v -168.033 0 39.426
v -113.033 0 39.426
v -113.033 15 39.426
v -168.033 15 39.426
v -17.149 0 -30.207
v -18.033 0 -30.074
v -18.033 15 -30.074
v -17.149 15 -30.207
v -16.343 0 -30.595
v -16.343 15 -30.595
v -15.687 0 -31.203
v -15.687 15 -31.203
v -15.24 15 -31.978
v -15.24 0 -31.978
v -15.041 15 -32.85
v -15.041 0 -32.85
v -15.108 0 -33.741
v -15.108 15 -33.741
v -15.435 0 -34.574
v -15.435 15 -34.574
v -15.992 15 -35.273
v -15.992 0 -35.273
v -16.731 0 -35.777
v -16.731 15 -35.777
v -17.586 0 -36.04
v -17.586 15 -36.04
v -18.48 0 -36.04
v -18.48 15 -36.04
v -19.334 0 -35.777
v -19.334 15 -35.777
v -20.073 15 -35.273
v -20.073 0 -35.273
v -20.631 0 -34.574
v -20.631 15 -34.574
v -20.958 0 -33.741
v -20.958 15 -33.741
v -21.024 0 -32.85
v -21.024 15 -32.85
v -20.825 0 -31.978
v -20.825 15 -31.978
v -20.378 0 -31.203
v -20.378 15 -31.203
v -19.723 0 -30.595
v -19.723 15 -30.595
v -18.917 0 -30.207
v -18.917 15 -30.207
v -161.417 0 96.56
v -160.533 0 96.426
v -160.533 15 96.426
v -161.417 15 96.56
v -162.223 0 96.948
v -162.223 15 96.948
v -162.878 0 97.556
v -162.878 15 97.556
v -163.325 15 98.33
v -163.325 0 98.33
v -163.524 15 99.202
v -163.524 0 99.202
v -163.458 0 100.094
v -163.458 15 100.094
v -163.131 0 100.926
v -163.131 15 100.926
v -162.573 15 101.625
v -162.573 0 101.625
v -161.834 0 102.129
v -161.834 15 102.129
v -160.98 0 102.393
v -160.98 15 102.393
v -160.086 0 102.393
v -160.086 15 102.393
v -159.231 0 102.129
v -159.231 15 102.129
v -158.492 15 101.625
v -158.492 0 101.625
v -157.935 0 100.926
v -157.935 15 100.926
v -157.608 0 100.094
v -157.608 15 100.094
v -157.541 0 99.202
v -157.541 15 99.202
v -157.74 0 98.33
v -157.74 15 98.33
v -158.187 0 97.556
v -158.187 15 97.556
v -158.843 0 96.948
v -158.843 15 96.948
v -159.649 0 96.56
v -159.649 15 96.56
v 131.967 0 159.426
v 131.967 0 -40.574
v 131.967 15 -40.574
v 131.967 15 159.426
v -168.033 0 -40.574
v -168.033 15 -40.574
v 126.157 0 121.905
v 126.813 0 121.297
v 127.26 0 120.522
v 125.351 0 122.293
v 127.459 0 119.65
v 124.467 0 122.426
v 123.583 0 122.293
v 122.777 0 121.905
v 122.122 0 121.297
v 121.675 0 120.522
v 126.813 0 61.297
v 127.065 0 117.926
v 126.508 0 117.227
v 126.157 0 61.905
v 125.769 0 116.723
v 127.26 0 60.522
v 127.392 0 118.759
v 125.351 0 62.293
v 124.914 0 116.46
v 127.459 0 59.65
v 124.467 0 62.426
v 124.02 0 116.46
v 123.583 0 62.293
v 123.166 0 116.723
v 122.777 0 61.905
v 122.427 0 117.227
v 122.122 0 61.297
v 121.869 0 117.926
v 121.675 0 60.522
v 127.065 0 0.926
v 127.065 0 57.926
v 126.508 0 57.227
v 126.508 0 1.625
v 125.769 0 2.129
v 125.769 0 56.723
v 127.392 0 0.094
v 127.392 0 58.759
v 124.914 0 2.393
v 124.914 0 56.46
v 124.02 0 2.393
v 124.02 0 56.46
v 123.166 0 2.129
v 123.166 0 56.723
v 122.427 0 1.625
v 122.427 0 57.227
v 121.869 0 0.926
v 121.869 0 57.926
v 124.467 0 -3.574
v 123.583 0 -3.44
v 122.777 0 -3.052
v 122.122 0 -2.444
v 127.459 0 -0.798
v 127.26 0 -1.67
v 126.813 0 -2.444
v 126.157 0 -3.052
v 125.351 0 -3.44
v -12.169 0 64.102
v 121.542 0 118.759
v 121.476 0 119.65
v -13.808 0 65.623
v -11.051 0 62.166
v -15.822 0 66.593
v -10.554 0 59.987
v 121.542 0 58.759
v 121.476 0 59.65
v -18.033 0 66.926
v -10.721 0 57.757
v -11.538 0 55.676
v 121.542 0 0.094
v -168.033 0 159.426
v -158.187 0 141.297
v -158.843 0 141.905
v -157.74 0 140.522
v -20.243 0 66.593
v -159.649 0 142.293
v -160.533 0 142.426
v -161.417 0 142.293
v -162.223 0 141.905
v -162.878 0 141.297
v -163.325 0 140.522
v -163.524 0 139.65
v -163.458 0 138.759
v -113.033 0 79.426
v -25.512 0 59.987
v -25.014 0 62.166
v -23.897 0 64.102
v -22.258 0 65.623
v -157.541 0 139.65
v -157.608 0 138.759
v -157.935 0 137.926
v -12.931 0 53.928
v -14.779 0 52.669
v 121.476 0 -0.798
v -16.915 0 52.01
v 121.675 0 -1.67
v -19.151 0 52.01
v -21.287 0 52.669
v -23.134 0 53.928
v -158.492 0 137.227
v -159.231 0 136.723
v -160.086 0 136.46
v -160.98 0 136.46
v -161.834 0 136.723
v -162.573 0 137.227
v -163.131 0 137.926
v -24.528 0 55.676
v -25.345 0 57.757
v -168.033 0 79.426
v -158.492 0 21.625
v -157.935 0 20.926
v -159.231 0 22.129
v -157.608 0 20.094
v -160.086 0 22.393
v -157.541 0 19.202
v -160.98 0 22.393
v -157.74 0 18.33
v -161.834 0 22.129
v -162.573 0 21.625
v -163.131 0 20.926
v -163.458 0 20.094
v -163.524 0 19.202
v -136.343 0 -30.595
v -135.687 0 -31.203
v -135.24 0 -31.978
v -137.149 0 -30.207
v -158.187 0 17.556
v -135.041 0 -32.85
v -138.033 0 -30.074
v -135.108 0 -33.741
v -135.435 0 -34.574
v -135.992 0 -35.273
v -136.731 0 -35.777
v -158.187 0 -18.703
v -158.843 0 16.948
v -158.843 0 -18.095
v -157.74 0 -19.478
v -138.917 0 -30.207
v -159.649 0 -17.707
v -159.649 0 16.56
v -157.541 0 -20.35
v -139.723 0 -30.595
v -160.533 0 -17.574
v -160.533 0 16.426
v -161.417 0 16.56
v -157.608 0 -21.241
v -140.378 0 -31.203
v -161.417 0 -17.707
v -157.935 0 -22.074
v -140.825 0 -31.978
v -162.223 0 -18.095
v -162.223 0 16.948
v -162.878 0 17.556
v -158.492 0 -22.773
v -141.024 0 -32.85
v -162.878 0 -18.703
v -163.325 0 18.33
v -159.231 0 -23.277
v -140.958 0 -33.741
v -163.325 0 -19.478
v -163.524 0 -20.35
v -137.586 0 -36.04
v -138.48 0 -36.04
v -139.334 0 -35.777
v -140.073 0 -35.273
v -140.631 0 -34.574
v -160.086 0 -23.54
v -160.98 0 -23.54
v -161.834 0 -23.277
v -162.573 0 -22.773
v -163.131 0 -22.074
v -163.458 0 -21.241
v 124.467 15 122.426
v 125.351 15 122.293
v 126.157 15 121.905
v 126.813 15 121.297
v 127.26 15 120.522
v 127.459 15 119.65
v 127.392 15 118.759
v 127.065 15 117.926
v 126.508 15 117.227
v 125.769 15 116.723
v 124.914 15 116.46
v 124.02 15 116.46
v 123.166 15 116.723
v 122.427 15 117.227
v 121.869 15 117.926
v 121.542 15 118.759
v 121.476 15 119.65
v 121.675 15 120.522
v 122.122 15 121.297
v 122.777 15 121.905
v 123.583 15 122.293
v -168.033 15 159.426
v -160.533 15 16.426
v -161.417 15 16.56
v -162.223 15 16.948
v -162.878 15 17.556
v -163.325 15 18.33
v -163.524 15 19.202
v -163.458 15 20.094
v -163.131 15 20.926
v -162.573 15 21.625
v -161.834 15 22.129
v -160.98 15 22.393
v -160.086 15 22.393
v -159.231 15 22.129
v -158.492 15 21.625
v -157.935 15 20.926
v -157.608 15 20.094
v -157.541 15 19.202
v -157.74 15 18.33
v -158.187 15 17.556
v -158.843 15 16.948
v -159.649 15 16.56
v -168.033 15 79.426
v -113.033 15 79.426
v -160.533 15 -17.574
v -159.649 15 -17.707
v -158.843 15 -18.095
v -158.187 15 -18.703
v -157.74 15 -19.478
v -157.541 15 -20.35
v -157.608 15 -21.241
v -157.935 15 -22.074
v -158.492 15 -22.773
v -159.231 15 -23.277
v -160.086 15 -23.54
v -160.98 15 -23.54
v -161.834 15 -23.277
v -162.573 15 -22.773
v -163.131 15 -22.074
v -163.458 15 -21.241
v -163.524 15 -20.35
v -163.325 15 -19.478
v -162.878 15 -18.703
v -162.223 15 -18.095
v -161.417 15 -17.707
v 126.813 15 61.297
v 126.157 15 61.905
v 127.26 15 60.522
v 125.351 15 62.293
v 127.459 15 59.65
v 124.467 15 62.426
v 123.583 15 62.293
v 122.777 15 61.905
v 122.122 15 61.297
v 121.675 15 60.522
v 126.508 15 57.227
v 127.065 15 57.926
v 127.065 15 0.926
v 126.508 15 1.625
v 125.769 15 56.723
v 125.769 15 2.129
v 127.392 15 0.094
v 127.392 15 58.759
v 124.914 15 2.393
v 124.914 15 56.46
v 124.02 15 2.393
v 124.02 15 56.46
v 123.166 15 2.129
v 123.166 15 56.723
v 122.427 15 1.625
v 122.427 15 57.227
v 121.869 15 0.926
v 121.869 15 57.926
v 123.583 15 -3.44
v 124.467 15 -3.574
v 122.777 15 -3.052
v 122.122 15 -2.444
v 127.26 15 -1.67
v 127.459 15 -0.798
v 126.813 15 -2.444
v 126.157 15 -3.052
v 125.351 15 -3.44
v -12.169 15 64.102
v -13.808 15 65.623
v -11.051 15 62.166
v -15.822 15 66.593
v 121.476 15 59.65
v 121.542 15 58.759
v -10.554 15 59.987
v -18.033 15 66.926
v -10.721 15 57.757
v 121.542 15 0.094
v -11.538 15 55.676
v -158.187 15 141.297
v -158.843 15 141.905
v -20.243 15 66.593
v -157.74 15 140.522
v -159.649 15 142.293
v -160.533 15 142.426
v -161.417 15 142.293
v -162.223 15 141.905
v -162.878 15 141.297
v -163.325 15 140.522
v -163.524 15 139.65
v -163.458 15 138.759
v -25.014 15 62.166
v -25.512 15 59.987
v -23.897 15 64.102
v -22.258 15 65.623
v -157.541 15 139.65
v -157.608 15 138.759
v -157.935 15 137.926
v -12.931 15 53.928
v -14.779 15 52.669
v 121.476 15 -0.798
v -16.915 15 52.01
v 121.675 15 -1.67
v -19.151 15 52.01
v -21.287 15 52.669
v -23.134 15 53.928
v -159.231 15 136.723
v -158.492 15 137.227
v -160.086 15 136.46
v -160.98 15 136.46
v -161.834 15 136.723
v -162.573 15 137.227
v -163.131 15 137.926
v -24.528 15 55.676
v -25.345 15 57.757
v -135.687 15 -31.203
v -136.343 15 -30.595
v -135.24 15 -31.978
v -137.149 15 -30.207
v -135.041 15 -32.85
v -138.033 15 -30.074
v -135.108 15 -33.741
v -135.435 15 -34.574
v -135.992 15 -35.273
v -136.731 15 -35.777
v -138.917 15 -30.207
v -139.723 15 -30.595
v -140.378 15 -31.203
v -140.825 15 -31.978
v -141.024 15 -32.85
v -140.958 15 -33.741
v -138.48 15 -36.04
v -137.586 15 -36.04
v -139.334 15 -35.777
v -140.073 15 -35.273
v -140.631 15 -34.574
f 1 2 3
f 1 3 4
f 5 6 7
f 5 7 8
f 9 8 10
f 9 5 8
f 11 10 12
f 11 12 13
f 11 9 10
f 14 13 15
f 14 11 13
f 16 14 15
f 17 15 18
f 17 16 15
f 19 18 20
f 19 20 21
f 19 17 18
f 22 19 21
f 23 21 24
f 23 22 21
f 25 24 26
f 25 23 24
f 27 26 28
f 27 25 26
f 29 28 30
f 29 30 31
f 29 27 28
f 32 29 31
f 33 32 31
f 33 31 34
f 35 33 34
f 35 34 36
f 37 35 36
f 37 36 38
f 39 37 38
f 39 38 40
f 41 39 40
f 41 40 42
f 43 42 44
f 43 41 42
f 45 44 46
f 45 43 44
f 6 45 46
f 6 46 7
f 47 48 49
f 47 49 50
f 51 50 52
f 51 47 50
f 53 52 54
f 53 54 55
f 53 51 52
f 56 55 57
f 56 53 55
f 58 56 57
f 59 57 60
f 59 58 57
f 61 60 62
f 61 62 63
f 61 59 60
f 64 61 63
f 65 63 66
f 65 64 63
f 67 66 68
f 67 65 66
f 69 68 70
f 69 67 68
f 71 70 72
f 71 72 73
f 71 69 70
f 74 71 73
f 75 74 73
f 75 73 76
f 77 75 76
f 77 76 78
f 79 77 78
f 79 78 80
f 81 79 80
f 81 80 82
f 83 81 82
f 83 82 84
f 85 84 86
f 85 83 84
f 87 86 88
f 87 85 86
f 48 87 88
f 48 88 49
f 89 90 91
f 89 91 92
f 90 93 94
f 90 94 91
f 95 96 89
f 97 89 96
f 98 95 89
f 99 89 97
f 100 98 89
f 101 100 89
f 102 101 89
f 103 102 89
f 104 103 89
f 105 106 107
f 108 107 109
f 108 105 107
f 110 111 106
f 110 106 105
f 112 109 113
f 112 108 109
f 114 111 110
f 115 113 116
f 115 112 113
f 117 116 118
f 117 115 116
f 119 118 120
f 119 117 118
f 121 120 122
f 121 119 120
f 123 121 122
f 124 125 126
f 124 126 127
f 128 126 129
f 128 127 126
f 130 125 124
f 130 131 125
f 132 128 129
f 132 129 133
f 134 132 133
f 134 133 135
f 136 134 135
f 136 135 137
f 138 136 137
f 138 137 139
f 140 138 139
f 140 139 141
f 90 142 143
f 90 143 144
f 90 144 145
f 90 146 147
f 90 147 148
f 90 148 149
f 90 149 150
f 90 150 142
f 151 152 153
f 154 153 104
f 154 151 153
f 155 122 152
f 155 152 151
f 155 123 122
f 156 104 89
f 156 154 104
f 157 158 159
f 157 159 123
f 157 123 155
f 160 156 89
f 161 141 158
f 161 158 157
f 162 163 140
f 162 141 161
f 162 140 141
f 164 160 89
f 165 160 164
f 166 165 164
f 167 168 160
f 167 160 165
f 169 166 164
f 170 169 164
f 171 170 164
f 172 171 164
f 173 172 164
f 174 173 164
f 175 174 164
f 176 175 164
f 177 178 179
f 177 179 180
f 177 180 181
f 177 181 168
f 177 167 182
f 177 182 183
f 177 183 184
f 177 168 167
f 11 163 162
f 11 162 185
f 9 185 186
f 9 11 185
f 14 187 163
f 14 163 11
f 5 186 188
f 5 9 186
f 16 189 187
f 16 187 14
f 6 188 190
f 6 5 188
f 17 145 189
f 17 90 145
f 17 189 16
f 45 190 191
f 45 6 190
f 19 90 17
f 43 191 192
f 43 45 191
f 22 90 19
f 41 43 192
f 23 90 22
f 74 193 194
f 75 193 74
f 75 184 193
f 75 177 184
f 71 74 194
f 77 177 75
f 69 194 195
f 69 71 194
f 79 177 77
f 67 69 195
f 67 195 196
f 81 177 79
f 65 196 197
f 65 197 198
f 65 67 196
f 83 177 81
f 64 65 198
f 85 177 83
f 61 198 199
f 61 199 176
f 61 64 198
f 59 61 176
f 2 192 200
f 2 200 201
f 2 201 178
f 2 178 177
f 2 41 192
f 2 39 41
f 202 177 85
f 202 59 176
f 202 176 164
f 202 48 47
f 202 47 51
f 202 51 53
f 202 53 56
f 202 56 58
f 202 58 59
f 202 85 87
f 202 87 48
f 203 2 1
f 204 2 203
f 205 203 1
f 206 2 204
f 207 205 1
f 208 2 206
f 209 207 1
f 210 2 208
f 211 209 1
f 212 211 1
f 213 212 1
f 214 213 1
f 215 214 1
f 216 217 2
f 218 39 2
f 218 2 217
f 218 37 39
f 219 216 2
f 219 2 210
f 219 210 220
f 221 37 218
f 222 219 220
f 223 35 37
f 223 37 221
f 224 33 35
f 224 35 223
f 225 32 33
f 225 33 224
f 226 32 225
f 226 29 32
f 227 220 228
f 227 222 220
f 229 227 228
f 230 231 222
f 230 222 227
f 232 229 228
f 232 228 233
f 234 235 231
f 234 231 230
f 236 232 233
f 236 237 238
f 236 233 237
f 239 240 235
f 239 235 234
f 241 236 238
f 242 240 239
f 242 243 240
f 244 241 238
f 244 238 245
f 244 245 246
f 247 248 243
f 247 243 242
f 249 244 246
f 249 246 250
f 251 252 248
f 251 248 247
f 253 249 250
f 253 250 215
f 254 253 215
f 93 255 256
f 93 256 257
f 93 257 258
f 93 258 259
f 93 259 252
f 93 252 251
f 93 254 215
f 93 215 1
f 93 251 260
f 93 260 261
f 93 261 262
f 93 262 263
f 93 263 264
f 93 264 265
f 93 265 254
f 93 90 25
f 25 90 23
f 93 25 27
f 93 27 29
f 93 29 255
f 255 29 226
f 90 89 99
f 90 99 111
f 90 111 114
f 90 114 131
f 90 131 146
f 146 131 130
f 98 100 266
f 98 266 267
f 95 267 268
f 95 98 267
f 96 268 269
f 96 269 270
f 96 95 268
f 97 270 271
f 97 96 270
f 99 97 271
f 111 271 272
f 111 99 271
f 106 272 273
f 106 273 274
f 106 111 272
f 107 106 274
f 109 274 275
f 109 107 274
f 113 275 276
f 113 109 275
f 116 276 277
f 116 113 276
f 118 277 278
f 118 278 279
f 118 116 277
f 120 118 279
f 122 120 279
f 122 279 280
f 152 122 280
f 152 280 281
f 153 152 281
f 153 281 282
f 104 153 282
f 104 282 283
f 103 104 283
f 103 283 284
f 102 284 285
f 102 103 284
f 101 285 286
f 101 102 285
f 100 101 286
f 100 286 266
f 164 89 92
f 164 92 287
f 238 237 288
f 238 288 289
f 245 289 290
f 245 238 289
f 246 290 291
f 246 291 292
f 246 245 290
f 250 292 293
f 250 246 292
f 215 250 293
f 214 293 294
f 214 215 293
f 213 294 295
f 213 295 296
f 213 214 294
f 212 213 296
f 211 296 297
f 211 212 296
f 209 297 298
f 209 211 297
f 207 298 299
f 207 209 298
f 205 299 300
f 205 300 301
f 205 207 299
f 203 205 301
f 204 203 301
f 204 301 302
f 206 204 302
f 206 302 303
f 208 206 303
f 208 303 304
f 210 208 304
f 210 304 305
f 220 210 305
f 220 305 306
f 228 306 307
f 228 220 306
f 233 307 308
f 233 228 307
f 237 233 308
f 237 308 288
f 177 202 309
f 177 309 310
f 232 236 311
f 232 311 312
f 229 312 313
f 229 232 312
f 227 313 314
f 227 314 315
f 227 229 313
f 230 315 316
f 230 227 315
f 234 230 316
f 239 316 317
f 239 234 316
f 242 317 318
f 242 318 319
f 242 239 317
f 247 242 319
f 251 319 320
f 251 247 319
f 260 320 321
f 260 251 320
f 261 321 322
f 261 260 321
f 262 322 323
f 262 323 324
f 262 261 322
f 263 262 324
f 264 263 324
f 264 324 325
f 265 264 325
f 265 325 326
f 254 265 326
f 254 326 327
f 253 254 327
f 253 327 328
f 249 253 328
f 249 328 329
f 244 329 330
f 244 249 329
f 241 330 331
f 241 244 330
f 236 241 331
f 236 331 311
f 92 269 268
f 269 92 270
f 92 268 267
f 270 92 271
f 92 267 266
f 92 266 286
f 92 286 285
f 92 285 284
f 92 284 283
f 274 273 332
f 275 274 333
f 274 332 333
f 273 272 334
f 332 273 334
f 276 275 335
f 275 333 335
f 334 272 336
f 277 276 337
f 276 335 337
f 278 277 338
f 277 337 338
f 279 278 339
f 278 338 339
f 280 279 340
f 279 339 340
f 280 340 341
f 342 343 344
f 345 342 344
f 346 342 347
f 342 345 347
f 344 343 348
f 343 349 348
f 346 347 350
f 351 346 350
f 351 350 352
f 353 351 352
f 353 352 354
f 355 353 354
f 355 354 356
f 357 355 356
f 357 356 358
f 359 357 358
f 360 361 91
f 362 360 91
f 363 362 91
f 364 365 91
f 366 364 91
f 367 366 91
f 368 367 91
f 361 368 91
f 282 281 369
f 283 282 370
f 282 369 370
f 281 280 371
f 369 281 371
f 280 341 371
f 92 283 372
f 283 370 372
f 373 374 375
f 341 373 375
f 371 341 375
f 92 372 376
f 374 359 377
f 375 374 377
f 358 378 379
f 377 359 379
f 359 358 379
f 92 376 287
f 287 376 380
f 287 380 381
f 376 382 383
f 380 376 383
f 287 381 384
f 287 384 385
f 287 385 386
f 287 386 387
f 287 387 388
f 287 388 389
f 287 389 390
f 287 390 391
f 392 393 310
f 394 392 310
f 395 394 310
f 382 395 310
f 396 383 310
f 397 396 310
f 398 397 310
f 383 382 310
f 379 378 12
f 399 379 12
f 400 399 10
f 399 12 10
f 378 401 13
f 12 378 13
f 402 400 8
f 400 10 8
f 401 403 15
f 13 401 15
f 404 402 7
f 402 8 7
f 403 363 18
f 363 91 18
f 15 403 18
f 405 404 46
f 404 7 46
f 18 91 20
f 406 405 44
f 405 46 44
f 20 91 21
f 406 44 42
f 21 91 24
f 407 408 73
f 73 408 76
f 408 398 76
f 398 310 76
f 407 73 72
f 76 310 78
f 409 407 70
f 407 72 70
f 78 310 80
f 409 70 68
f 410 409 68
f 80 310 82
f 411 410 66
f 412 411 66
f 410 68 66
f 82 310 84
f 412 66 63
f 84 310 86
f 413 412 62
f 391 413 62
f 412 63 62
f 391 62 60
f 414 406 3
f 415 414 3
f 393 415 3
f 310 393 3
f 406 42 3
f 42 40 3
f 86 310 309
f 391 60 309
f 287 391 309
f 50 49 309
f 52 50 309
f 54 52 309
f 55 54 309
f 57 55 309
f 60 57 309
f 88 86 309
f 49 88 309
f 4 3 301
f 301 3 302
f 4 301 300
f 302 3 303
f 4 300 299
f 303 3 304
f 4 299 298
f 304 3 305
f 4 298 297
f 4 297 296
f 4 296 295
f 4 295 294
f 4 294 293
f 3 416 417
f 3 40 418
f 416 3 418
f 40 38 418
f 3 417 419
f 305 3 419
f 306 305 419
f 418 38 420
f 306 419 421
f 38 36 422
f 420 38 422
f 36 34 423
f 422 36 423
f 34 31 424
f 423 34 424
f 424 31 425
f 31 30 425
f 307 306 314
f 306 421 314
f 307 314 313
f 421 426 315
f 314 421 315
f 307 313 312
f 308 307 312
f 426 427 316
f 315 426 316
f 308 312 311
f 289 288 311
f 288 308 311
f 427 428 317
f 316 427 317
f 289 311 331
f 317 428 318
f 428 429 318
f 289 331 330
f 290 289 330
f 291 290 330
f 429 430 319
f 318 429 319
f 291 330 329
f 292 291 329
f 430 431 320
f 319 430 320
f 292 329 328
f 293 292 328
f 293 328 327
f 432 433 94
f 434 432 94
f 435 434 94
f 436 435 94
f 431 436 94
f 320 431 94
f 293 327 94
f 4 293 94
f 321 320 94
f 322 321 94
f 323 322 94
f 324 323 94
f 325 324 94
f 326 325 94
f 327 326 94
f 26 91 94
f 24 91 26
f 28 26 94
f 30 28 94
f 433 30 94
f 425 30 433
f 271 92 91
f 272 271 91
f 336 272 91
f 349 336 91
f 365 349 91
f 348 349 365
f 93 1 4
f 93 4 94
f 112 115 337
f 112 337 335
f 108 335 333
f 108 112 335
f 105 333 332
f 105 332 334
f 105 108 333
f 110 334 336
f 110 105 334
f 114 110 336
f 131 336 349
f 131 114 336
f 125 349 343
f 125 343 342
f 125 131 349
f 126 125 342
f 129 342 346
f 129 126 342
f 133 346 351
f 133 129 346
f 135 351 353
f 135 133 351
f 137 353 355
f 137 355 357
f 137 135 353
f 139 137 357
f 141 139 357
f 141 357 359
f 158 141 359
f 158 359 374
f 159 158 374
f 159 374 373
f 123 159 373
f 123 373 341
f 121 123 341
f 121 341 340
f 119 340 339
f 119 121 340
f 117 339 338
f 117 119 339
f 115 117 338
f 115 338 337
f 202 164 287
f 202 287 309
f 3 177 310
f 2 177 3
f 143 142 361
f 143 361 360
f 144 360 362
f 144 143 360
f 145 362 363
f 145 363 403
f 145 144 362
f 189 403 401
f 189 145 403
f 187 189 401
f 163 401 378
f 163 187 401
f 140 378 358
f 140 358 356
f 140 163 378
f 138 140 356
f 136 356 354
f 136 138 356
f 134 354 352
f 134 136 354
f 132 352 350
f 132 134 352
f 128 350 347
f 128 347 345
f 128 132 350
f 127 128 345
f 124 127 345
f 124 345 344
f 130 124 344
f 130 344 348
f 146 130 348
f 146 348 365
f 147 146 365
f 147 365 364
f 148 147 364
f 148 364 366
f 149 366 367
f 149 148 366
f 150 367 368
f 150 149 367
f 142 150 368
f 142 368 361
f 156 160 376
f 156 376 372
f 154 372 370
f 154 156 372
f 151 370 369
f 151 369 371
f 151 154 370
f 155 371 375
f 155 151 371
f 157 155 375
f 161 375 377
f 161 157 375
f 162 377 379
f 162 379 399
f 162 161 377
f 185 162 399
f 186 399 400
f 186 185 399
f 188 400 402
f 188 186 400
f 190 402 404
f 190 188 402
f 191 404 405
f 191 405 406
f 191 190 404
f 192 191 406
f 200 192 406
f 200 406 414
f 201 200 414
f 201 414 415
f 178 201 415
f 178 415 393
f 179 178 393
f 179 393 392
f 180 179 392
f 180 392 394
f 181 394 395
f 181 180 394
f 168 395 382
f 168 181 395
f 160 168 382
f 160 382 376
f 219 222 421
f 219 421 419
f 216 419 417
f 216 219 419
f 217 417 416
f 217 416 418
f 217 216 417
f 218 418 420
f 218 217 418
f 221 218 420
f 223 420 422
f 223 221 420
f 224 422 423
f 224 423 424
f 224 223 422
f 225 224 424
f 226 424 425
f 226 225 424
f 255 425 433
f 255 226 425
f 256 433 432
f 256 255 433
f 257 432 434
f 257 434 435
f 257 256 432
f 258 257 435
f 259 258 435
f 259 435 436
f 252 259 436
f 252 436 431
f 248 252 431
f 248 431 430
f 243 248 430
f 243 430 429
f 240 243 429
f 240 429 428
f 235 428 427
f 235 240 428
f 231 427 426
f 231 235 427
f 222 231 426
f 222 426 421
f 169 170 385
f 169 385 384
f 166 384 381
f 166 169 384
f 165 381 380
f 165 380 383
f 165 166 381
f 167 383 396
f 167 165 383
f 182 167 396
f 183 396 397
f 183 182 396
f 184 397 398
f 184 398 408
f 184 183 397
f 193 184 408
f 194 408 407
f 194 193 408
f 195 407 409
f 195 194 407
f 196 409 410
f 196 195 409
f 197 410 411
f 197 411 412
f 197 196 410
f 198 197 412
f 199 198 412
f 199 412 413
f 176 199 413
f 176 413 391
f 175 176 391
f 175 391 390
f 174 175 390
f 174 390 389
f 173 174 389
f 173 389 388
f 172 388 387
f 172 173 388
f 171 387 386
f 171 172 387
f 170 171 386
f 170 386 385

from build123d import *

# Parameters (mm, degrees)
SKETCH2_R           = 7.5
SKETCH2_R_2         = 3
BOSS_EXTRUDE2_DEPTH = 15


with BuildPart() as part:
    # Sketch2 → Boss-Extrude2 (new body)
    with BuildSketch(Plane(origin=(0, 0, 0), x_dir=(1, 0, 0), z_dir=(0, 1, 0))):
        Polygon((-168.032786885, 40.573770492), (131.967213115, 40.573770492), (131.967213115, -159.426229508), (-168.032786885, -159.426229508), (-168.032786885, -79.426229508), (-113.032786885, -79.426229508), (-113.032786885, -39.426229508), (-168.032786885, -39.426229508), align=None)
        with Locations(Location((-18.032786885, -59.426229508, 0), (0, 0, 270))):
            Circle(SKETCH2_R, mode=Mode.SUBTRACT)
        with Locations(Location((-160.532786885, 20.573770492, 0), (0, 0, 270))):
            Circle(SKETCH2_R_2, mode=Mode.SUBTRACT)
        with Locations(Location((-160.532786885, -19.426229508, 0), (0, 0, 90))):
            Circle(SKETCH2_R_2, mode=Mode.SUBTRACT)
        with Locations(Location((-160.532786885, -139.426229508, 0), (0, 0, 270))):
            Circle(SKETCH2_R_2, mode=Mode.SUBTRACT)
        with Locations(Location((-160.532786885, -99.426229508, 0), (0, 0, 90))):
            Circle(SKETCH2_R_2, mode=Mode.SUBTRACT)
        with Locations(Location((124.467213115, -119.426229508, 0), (0, 0, 270))):
            Circle(SKETCH2_R_2, mode=Mode.SUBTRACT)
        with Locations(Location((124.467213115, 0.573770492, 0), (0, 0, 90))):
            Circle(SKETCH2_R_2, mode=Mode.SUBTRACT)
        with Locations(Location((124.467213115, -59.426229508, 0), (0, 0, 270))):
            Circle(SKETCH2_R_2, mode=Mode.SUBTRACT)
        with Locations(Location((-18.032786885, 33.073770492, 0), (0, 0, 270))):
            Circle(SKETCH2_R_2, mode=Mode.SUBTRACT)
        with Locations(Location((-138.032786885, 33.073770492, 0), (0, 0, 270))):
            Circle(SKETCH2_R_2, mode=Mode.SUBTRACT)
    extrude(amount=BOSS_EXTRUDE2_DEPTH)


solid = part.part
